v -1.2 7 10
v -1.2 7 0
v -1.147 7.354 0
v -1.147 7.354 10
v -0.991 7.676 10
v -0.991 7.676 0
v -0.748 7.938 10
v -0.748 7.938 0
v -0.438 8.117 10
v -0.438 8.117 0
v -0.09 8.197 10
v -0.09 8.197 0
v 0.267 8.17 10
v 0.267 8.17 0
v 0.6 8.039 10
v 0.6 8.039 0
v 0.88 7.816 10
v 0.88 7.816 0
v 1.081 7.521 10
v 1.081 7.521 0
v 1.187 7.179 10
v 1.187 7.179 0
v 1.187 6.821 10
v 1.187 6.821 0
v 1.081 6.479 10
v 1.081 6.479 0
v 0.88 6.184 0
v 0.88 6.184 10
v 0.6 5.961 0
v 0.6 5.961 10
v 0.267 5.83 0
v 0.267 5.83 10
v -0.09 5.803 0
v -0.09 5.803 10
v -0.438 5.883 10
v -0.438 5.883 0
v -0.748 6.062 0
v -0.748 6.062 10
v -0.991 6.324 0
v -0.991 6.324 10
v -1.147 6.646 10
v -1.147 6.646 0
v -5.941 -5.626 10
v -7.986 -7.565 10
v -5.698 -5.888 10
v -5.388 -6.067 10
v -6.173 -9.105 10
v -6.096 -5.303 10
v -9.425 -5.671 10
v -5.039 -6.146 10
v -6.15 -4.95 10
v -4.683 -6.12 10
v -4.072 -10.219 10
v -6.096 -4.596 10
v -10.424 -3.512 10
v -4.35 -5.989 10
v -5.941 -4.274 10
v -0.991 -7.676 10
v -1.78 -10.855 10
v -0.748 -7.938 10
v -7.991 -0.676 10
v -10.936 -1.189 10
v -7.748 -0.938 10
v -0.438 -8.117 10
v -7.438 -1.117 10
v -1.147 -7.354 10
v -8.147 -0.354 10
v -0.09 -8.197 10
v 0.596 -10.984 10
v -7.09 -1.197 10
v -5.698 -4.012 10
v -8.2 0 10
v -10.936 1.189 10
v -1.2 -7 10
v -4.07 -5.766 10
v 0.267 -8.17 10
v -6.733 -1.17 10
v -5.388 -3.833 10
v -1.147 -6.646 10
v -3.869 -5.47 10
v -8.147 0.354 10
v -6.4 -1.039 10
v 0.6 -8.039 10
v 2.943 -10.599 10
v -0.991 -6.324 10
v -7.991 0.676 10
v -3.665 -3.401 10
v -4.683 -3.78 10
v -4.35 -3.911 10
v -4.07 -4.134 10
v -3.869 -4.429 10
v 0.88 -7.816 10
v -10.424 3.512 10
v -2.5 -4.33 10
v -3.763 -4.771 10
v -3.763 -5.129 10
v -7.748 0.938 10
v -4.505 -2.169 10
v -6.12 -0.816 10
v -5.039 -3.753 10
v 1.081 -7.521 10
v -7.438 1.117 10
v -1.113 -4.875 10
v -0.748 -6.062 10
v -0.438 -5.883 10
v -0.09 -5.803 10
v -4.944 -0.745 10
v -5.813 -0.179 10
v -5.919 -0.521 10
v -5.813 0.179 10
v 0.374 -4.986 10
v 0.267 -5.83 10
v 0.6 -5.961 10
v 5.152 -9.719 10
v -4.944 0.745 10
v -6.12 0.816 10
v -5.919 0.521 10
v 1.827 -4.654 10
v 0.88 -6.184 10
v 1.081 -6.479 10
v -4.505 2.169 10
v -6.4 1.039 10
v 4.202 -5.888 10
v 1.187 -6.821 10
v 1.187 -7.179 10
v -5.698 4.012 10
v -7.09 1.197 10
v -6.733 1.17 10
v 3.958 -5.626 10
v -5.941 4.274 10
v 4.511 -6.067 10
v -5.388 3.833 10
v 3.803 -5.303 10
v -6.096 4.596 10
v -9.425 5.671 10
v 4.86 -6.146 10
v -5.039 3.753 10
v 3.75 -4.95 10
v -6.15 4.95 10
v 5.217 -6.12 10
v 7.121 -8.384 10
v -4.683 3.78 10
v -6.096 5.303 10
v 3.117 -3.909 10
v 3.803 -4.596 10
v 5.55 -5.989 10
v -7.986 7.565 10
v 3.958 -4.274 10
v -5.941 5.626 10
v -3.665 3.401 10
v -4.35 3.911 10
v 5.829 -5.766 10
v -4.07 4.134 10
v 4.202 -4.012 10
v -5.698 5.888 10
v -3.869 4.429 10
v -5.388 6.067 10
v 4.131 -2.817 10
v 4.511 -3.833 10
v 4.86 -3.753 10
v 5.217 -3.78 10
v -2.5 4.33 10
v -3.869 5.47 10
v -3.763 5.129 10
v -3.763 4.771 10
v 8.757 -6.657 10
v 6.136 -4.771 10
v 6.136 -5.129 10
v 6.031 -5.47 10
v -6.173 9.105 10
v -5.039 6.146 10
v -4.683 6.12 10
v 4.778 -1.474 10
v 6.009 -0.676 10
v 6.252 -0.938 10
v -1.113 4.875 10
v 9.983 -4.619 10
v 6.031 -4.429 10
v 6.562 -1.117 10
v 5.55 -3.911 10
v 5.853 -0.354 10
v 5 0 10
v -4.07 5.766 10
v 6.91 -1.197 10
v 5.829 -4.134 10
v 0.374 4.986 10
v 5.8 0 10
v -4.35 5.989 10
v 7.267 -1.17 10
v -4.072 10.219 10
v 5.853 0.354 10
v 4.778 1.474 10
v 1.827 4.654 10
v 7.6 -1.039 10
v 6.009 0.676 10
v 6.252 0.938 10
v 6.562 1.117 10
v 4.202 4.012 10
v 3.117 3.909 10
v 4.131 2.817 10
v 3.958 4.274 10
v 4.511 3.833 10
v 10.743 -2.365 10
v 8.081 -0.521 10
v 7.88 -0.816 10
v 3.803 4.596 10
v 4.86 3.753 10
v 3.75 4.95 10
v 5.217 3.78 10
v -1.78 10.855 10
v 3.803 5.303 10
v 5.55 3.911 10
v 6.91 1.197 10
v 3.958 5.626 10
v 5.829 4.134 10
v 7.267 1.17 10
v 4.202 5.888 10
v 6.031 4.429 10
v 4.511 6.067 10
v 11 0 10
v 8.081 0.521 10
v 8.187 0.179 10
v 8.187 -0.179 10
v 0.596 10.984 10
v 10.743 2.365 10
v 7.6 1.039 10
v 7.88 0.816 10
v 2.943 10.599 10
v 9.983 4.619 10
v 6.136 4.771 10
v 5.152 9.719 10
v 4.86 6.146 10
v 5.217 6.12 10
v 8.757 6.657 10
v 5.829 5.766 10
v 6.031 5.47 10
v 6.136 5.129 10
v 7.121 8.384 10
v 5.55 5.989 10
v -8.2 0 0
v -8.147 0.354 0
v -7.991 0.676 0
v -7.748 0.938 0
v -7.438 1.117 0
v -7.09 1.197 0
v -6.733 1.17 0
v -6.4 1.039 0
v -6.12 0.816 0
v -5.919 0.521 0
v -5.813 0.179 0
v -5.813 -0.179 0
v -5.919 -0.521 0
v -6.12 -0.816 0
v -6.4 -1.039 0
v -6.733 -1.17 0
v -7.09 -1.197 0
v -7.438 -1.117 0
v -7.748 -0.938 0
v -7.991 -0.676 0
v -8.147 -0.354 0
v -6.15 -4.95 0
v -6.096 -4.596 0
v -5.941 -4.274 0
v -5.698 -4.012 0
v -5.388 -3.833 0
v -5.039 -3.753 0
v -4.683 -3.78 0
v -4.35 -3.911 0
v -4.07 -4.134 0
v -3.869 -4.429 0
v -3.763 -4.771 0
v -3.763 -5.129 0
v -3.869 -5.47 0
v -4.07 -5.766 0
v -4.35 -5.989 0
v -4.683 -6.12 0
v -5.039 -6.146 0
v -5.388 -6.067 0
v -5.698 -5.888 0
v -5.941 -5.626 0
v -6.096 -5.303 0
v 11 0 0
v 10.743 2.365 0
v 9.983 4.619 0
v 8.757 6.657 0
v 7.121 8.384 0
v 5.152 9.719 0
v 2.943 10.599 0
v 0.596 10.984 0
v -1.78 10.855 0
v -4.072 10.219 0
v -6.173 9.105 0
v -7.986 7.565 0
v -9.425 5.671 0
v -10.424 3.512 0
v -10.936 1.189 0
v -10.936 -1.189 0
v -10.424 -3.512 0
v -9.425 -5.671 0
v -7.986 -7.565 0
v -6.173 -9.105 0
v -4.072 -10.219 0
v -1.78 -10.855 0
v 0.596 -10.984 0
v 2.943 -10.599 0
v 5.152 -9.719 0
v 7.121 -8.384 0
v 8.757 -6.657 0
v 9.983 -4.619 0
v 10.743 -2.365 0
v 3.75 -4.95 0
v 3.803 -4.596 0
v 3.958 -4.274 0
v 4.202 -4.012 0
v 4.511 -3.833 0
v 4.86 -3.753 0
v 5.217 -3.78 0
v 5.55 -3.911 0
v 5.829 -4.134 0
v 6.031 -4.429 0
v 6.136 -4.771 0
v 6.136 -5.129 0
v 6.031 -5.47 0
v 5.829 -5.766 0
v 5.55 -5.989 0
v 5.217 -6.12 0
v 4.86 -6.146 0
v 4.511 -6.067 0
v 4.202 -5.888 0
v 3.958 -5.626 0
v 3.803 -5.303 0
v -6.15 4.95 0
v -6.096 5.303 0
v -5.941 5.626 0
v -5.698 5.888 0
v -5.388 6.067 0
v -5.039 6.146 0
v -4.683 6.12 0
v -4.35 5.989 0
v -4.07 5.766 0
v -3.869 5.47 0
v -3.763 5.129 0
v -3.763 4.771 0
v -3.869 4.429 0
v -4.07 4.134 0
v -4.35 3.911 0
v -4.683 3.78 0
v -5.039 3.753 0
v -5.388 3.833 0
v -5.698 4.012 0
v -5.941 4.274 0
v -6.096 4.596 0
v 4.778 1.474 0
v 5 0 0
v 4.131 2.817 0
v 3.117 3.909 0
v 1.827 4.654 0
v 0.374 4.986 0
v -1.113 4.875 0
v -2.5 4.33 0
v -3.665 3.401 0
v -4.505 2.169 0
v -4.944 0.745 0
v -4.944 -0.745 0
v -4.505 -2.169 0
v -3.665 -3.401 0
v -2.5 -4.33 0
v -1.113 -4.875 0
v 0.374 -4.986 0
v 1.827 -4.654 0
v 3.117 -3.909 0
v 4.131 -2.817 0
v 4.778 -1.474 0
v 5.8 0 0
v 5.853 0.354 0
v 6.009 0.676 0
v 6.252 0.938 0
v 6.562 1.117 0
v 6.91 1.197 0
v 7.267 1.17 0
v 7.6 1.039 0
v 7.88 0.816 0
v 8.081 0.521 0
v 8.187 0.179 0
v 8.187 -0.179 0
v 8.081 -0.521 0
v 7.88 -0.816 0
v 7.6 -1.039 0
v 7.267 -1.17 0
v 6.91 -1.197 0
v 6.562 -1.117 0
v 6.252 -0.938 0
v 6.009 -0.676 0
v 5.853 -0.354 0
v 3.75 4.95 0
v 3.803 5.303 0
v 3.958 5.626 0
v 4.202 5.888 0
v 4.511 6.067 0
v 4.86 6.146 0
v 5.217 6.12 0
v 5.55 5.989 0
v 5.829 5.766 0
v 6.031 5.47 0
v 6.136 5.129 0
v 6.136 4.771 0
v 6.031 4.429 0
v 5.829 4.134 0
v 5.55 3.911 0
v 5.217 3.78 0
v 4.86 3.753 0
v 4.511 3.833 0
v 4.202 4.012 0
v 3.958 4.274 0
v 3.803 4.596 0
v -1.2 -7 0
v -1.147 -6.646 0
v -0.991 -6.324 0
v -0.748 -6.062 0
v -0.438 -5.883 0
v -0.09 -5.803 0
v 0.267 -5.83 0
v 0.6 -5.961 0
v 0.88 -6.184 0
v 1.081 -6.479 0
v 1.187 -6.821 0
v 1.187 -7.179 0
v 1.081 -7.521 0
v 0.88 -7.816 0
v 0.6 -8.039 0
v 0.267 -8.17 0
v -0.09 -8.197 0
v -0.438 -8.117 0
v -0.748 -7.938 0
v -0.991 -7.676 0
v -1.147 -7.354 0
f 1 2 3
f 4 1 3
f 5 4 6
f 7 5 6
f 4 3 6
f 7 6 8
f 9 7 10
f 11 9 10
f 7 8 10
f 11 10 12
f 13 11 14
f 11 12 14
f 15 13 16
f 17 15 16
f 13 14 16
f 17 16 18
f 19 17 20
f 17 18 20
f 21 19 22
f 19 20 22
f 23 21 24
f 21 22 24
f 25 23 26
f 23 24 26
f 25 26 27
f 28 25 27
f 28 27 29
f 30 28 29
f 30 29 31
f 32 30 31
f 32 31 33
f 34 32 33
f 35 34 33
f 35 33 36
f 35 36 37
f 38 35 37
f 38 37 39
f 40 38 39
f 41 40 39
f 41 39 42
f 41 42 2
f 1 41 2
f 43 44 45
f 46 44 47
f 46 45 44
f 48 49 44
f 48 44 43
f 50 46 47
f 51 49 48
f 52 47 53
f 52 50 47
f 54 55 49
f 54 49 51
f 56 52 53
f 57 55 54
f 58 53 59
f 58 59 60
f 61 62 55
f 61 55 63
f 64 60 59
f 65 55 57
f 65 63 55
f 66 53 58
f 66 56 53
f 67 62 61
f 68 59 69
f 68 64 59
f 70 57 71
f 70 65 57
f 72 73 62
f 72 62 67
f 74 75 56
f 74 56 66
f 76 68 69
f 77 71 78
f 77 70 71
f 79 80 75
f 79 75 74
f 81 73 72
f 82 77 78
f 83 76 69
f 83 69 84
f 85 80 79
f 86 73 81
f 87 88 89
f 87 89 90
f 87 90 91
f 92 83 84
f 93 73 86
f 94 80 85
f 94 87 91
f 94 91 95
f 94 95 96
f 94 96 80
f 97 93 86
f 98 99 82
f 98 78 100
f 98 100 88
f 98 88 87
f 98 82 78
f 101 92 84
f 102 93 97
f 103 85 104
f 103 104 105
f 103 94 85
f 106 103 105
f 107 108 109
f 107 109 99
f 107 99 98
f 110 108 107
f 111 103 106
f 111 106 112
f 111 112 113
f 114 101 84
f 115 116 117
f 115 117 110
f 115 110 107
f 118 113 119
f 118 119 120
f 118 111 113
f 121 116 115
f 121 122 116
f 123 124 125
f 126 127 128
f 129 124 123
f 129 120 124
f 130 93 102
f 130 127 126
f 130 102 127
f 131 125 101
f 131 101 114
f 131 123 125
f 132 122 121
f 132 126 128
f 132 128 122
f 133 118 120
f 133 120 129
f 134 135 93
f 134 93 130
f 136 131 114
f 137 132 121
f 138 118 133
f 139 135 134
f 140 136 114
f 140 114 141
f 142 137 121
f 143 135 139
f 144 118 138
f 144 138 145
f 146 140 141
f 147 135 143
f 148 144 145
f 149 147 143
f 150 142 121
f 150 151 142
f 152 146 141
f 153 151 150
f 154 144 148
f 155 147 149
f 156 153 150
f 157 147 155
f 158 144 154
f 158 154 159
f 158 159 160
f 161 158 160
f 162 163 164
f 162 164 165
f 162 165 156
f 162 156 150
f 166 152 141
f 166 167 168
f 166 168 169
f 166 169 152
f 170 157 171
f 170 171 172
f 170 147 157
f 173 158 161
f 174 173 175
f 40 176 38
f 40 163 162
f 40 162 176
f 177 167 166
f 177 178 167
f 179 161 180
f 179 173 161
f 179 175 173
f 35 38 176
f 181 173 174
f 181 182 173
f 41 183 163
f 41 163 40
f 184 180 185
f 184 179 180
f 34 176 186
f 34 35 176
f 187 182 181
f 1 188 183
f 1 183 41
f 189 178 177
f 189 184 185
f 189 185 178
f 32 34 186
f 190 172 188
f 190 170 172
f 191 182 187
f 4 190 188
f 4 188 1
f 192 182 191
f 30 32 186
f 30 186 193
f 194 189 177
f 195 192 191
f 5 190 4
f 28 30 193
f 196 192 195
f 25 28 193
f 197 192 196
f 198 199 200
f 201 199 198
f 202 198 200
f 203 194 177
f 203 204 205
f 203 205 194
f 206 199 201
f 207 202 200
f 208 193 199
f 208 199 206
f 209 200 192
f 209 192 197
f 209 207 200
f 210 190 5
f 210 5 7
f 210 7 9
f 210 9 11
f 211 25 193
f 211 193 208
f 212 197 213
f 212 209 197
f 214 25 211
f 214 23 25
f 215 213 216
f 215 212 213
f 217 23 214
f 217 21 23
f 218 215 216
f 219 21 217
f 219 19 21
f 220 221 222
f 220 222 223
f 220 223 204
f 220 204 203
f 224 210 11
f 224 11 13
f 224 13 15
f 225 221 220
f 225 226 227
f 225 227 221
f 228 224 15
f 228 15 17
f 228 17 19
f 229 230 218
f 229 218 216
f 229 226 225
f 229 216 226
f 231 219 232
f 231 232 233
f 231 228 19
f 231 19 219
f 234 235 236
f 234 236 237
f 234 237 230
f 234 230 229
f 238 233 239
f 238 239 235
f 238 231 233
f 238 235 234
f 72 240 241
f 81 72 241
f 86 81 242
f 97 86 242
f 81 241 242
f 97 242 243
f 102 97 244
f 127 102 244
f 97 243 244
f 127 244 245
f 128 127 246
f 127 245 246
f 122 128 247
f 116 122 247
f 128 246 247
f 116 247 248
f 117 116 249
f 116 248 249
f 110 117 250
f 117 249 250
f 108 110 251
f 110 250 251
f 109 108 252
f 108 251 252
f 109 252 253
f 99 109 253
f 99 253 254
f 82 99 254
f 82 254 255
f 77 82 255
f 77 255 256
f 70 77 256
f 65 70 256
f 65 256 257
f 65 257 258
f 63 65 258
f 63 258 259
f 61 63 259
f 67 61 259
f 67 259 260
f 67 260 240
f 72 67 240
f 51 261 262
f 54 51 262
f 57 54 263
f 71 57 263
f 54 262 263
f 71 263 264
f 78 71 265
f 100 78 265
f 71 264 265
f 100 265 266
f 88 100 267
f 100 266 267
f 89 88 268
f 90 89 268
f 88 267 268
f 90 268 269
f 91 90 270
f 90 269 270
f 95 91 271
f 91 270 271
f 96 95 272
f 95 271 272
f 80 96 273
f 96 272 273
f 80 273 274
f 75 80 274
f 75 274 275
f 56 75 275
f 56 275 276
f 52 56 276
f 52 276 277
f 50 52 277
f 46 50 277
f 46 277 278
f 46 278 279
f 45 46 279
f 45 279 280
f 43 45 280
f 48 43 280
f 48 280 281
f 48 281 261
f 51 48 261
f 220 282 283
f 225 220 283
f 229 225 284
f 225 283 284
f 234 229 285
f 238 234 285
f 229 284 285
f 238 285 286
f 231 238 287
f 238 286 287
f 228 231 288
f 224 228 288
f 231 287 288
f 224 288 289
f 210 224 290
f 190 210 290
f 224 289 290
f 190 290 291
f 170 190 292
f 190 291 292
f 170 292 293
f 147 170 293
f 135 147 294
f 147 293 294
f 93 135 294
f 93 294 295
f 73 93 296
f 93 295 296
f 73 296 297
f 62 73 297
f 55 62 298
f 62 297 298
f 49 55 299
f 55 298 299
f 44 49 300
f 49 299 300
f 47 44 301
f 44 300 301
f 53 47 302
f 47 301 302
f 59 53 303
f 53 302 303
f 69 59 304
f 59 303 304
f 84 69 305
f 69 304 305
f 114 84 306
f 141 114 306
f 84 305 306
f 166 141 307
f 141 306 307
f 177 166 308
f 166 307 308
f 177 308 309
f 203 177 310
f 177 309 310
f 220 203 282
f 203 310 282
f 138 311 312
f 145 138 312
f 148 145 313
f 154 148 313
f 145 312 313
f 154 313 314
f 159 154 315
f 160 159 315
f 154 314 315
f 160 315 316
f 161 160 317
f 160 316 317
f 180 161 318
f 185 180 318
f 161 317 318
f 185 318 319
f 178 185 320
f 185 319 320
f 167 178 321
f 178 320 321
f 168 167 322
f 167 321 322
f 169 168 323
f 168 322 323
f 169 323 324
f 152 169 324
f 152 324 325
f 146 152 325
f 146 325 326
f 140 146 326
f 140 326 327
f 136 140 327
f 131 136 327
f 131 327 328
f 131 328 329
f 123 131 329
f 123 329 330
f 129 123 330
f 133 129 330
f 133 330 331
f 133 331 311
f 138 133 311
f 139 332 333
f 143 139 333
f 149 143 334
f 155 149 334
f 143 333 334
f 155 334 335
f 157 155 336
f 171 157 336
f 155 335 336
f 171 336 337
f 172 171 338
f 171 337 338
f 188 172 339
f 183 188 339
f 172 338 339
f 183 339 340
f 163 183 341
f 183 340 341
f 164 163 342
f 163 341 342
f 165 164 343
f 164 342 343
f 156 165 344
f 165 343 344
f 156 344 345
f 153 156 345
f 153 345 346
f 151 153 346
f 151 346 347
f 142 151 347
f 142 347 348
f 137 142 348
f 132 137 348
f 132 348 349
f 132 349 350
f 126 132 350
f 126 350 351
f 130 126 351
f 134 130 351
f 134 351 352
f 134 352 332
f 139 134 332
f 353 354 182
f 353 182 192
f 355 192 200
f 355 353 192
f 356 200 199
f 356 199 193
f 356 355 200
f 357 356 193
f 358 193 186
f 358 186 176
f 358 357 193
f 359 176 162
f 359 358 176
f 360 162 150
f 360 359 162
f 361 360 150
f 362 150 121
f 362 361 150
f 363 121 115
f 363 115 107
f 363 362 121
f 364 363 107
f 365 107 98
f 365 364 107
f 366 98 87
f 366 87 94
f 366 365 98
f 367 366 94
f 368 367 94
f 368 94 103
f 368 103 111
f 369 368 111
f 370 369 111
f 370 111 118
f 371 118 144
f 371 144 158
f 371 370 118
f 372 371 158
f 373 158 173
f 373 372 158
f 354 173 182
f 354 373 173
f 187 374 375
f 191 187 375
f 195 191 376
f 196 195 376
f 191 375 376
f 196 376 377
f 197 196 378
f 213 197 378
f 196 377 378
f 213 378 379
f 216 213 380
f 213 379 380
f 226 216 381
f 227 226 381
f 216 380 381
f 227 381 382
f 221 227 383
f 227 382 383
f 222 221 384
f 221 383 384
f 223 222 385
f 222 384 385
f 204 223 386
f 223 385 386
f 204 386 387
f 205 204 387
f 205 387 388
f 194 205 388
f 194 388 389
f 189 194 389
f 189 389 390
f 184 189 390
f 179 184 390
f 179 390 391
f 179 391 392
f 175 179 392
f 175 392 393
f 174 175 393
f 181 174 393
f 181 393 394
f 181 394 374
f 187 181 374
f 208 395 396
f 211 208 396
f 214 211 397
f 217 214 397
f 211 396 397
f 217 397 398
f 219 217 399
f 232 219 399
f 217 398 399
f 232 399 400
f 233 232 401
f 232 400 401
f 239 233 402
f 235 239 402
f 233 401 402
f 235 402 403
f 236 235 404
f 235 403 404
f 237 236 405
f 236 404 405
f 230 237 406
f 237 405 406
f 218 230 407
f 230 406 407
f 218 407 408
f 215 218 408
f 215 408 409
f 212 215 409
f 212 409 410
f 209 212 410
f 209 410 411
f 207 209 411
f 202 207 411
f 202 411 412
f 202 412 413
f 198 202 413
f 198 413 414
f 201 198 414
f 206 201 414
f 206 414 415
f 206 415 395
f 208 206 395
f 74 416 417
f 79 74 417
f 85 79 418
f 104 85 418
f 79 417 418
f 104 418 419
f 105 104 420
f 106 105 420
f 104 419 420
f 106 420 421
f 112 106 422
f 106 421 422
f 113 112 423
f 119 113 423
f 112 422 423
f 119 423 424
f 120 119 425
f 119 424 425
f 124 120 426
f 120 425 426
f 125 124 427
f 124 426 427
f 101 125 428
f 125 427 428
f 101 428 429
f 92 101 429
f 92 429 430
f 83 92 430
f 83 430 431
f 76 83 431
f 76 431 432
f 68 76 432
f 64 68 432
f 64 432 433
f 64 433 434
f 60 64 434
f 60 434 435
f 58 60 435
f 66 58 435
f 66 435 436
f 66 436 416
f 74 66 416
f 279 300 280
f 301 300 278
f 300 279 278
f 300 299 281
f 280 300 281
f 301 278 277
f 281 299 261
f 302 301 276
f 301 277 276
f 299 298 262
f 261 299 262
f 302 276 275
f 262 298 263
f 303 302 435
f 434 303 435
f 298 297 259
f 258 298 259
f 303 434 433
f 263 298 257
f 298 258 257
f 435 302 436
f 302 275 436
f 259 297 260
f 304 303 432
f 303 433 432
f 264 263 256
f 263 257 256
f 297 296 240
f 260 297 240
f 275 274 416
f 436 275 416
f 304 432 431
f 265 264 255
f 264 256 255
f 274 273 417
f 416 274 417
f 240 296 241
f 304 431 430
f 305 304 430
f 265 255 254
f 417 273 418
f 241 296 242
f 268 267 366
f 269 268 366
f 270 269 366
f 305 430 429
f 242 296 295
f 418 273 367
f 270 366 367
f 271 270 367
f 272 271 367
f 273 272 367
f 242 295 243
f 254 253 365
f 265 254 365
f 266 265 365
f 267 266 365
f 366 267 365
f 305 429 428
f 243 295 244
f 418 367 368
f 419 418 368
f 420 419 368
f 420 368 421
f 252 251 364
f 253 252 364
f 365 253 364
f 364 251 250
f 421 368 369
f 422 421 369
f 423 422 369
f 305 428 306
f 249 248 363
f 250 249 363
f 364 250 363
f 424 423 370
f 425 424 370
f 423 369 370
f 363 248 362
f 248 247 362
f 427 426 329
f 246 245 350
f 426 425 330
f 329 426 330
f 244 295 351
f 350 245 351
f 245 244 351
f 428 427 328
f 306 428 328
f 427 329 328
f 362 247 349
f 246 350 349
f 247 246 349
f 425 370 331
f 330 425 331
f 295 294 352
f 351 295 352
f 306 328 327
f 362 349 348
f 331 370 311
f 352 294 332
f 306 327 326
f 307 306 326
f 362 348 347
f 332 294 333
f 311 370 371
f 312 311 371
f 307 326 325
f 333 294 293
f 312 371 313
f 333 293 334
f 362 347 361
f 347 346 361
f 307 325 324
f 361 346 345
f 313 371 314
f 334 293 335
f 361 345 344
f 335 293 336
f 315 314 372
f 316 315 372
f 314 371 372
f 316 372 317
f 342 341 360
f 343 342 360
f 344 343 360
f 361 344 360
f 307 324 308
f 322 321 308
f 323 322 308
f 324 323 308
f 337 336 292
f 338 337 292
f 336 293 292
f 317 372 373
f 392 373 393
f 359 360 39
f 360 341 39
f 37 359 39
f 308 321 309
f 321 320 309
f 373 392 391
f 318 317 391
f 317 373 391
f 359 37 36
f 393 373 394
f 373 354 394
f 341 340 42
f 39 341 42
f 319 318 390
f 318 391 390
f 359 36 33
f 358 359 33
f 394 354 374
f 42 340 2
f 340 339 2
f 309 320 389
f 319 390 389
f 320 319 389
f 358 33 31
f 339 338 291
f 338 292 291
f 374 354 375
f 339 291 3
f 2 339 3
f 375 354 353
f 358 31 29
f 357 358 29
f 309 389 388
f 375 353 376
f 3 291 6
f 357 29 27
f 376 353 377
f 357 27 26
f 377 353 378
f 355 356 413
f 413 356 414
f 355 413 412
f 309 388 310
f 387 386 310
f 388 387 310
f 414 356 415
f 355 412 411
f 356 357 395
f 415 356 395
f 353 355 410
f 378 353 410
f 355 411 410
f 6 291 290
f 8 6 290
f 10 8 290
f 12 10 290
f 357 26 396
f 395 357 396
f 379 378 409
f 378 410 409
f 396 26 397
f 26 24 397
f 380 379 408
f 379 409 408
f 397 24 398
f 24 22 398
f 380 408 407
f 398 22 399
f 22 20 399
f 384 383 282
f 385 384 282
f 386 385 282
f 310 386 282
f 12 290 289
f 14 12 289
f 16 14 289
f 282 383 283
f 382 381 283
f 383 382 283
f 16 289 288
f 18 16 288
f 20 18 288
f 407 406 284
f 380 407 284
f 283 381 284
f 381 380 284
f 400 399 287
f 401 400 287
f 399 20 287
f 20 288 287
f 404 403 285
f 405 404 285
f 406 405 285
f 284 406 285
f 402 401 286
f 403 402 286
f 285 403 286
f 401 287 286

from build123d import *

# Parameters (mm, degrees)
ESQUISSE1_R          = 11
ESQUISSE1_R_2        = 5
BOSS_EXTRU_1_DEPTH   = 10
D_GAGEMENT_M21_D     = 2.4
D_GAGEMENT_M21_DEPTH = 10


with BuildPart() as part:
    # Esquisse1 → Boss.-Extru.1 (new body)
    with BuildSketch(Plane.XY):
        Circle(ESQUISSE1_R)
        Circle(ESQUISSE1_R_2, mode=Mode.SUBTRACT)
    extrude(amount=BOSS_EXTRU_1_DEPTH)

    # Dégagement M21
    with Locations(Plane.XY.offset(10)):
        with Locations((0, 7), (4.949747468, 4.949747468), (7, 0), (4.949747468, -4.949747468), (0, -7), (-4.949747468, -4.949747468), (-7, 0), (-4.949747468, 4.949747468), (0, 0)):
            Hole(D_GAGEMENT_M21_D / 2, depth=D_GAGEMENT_M21_DEPTH)


solid = part.part
